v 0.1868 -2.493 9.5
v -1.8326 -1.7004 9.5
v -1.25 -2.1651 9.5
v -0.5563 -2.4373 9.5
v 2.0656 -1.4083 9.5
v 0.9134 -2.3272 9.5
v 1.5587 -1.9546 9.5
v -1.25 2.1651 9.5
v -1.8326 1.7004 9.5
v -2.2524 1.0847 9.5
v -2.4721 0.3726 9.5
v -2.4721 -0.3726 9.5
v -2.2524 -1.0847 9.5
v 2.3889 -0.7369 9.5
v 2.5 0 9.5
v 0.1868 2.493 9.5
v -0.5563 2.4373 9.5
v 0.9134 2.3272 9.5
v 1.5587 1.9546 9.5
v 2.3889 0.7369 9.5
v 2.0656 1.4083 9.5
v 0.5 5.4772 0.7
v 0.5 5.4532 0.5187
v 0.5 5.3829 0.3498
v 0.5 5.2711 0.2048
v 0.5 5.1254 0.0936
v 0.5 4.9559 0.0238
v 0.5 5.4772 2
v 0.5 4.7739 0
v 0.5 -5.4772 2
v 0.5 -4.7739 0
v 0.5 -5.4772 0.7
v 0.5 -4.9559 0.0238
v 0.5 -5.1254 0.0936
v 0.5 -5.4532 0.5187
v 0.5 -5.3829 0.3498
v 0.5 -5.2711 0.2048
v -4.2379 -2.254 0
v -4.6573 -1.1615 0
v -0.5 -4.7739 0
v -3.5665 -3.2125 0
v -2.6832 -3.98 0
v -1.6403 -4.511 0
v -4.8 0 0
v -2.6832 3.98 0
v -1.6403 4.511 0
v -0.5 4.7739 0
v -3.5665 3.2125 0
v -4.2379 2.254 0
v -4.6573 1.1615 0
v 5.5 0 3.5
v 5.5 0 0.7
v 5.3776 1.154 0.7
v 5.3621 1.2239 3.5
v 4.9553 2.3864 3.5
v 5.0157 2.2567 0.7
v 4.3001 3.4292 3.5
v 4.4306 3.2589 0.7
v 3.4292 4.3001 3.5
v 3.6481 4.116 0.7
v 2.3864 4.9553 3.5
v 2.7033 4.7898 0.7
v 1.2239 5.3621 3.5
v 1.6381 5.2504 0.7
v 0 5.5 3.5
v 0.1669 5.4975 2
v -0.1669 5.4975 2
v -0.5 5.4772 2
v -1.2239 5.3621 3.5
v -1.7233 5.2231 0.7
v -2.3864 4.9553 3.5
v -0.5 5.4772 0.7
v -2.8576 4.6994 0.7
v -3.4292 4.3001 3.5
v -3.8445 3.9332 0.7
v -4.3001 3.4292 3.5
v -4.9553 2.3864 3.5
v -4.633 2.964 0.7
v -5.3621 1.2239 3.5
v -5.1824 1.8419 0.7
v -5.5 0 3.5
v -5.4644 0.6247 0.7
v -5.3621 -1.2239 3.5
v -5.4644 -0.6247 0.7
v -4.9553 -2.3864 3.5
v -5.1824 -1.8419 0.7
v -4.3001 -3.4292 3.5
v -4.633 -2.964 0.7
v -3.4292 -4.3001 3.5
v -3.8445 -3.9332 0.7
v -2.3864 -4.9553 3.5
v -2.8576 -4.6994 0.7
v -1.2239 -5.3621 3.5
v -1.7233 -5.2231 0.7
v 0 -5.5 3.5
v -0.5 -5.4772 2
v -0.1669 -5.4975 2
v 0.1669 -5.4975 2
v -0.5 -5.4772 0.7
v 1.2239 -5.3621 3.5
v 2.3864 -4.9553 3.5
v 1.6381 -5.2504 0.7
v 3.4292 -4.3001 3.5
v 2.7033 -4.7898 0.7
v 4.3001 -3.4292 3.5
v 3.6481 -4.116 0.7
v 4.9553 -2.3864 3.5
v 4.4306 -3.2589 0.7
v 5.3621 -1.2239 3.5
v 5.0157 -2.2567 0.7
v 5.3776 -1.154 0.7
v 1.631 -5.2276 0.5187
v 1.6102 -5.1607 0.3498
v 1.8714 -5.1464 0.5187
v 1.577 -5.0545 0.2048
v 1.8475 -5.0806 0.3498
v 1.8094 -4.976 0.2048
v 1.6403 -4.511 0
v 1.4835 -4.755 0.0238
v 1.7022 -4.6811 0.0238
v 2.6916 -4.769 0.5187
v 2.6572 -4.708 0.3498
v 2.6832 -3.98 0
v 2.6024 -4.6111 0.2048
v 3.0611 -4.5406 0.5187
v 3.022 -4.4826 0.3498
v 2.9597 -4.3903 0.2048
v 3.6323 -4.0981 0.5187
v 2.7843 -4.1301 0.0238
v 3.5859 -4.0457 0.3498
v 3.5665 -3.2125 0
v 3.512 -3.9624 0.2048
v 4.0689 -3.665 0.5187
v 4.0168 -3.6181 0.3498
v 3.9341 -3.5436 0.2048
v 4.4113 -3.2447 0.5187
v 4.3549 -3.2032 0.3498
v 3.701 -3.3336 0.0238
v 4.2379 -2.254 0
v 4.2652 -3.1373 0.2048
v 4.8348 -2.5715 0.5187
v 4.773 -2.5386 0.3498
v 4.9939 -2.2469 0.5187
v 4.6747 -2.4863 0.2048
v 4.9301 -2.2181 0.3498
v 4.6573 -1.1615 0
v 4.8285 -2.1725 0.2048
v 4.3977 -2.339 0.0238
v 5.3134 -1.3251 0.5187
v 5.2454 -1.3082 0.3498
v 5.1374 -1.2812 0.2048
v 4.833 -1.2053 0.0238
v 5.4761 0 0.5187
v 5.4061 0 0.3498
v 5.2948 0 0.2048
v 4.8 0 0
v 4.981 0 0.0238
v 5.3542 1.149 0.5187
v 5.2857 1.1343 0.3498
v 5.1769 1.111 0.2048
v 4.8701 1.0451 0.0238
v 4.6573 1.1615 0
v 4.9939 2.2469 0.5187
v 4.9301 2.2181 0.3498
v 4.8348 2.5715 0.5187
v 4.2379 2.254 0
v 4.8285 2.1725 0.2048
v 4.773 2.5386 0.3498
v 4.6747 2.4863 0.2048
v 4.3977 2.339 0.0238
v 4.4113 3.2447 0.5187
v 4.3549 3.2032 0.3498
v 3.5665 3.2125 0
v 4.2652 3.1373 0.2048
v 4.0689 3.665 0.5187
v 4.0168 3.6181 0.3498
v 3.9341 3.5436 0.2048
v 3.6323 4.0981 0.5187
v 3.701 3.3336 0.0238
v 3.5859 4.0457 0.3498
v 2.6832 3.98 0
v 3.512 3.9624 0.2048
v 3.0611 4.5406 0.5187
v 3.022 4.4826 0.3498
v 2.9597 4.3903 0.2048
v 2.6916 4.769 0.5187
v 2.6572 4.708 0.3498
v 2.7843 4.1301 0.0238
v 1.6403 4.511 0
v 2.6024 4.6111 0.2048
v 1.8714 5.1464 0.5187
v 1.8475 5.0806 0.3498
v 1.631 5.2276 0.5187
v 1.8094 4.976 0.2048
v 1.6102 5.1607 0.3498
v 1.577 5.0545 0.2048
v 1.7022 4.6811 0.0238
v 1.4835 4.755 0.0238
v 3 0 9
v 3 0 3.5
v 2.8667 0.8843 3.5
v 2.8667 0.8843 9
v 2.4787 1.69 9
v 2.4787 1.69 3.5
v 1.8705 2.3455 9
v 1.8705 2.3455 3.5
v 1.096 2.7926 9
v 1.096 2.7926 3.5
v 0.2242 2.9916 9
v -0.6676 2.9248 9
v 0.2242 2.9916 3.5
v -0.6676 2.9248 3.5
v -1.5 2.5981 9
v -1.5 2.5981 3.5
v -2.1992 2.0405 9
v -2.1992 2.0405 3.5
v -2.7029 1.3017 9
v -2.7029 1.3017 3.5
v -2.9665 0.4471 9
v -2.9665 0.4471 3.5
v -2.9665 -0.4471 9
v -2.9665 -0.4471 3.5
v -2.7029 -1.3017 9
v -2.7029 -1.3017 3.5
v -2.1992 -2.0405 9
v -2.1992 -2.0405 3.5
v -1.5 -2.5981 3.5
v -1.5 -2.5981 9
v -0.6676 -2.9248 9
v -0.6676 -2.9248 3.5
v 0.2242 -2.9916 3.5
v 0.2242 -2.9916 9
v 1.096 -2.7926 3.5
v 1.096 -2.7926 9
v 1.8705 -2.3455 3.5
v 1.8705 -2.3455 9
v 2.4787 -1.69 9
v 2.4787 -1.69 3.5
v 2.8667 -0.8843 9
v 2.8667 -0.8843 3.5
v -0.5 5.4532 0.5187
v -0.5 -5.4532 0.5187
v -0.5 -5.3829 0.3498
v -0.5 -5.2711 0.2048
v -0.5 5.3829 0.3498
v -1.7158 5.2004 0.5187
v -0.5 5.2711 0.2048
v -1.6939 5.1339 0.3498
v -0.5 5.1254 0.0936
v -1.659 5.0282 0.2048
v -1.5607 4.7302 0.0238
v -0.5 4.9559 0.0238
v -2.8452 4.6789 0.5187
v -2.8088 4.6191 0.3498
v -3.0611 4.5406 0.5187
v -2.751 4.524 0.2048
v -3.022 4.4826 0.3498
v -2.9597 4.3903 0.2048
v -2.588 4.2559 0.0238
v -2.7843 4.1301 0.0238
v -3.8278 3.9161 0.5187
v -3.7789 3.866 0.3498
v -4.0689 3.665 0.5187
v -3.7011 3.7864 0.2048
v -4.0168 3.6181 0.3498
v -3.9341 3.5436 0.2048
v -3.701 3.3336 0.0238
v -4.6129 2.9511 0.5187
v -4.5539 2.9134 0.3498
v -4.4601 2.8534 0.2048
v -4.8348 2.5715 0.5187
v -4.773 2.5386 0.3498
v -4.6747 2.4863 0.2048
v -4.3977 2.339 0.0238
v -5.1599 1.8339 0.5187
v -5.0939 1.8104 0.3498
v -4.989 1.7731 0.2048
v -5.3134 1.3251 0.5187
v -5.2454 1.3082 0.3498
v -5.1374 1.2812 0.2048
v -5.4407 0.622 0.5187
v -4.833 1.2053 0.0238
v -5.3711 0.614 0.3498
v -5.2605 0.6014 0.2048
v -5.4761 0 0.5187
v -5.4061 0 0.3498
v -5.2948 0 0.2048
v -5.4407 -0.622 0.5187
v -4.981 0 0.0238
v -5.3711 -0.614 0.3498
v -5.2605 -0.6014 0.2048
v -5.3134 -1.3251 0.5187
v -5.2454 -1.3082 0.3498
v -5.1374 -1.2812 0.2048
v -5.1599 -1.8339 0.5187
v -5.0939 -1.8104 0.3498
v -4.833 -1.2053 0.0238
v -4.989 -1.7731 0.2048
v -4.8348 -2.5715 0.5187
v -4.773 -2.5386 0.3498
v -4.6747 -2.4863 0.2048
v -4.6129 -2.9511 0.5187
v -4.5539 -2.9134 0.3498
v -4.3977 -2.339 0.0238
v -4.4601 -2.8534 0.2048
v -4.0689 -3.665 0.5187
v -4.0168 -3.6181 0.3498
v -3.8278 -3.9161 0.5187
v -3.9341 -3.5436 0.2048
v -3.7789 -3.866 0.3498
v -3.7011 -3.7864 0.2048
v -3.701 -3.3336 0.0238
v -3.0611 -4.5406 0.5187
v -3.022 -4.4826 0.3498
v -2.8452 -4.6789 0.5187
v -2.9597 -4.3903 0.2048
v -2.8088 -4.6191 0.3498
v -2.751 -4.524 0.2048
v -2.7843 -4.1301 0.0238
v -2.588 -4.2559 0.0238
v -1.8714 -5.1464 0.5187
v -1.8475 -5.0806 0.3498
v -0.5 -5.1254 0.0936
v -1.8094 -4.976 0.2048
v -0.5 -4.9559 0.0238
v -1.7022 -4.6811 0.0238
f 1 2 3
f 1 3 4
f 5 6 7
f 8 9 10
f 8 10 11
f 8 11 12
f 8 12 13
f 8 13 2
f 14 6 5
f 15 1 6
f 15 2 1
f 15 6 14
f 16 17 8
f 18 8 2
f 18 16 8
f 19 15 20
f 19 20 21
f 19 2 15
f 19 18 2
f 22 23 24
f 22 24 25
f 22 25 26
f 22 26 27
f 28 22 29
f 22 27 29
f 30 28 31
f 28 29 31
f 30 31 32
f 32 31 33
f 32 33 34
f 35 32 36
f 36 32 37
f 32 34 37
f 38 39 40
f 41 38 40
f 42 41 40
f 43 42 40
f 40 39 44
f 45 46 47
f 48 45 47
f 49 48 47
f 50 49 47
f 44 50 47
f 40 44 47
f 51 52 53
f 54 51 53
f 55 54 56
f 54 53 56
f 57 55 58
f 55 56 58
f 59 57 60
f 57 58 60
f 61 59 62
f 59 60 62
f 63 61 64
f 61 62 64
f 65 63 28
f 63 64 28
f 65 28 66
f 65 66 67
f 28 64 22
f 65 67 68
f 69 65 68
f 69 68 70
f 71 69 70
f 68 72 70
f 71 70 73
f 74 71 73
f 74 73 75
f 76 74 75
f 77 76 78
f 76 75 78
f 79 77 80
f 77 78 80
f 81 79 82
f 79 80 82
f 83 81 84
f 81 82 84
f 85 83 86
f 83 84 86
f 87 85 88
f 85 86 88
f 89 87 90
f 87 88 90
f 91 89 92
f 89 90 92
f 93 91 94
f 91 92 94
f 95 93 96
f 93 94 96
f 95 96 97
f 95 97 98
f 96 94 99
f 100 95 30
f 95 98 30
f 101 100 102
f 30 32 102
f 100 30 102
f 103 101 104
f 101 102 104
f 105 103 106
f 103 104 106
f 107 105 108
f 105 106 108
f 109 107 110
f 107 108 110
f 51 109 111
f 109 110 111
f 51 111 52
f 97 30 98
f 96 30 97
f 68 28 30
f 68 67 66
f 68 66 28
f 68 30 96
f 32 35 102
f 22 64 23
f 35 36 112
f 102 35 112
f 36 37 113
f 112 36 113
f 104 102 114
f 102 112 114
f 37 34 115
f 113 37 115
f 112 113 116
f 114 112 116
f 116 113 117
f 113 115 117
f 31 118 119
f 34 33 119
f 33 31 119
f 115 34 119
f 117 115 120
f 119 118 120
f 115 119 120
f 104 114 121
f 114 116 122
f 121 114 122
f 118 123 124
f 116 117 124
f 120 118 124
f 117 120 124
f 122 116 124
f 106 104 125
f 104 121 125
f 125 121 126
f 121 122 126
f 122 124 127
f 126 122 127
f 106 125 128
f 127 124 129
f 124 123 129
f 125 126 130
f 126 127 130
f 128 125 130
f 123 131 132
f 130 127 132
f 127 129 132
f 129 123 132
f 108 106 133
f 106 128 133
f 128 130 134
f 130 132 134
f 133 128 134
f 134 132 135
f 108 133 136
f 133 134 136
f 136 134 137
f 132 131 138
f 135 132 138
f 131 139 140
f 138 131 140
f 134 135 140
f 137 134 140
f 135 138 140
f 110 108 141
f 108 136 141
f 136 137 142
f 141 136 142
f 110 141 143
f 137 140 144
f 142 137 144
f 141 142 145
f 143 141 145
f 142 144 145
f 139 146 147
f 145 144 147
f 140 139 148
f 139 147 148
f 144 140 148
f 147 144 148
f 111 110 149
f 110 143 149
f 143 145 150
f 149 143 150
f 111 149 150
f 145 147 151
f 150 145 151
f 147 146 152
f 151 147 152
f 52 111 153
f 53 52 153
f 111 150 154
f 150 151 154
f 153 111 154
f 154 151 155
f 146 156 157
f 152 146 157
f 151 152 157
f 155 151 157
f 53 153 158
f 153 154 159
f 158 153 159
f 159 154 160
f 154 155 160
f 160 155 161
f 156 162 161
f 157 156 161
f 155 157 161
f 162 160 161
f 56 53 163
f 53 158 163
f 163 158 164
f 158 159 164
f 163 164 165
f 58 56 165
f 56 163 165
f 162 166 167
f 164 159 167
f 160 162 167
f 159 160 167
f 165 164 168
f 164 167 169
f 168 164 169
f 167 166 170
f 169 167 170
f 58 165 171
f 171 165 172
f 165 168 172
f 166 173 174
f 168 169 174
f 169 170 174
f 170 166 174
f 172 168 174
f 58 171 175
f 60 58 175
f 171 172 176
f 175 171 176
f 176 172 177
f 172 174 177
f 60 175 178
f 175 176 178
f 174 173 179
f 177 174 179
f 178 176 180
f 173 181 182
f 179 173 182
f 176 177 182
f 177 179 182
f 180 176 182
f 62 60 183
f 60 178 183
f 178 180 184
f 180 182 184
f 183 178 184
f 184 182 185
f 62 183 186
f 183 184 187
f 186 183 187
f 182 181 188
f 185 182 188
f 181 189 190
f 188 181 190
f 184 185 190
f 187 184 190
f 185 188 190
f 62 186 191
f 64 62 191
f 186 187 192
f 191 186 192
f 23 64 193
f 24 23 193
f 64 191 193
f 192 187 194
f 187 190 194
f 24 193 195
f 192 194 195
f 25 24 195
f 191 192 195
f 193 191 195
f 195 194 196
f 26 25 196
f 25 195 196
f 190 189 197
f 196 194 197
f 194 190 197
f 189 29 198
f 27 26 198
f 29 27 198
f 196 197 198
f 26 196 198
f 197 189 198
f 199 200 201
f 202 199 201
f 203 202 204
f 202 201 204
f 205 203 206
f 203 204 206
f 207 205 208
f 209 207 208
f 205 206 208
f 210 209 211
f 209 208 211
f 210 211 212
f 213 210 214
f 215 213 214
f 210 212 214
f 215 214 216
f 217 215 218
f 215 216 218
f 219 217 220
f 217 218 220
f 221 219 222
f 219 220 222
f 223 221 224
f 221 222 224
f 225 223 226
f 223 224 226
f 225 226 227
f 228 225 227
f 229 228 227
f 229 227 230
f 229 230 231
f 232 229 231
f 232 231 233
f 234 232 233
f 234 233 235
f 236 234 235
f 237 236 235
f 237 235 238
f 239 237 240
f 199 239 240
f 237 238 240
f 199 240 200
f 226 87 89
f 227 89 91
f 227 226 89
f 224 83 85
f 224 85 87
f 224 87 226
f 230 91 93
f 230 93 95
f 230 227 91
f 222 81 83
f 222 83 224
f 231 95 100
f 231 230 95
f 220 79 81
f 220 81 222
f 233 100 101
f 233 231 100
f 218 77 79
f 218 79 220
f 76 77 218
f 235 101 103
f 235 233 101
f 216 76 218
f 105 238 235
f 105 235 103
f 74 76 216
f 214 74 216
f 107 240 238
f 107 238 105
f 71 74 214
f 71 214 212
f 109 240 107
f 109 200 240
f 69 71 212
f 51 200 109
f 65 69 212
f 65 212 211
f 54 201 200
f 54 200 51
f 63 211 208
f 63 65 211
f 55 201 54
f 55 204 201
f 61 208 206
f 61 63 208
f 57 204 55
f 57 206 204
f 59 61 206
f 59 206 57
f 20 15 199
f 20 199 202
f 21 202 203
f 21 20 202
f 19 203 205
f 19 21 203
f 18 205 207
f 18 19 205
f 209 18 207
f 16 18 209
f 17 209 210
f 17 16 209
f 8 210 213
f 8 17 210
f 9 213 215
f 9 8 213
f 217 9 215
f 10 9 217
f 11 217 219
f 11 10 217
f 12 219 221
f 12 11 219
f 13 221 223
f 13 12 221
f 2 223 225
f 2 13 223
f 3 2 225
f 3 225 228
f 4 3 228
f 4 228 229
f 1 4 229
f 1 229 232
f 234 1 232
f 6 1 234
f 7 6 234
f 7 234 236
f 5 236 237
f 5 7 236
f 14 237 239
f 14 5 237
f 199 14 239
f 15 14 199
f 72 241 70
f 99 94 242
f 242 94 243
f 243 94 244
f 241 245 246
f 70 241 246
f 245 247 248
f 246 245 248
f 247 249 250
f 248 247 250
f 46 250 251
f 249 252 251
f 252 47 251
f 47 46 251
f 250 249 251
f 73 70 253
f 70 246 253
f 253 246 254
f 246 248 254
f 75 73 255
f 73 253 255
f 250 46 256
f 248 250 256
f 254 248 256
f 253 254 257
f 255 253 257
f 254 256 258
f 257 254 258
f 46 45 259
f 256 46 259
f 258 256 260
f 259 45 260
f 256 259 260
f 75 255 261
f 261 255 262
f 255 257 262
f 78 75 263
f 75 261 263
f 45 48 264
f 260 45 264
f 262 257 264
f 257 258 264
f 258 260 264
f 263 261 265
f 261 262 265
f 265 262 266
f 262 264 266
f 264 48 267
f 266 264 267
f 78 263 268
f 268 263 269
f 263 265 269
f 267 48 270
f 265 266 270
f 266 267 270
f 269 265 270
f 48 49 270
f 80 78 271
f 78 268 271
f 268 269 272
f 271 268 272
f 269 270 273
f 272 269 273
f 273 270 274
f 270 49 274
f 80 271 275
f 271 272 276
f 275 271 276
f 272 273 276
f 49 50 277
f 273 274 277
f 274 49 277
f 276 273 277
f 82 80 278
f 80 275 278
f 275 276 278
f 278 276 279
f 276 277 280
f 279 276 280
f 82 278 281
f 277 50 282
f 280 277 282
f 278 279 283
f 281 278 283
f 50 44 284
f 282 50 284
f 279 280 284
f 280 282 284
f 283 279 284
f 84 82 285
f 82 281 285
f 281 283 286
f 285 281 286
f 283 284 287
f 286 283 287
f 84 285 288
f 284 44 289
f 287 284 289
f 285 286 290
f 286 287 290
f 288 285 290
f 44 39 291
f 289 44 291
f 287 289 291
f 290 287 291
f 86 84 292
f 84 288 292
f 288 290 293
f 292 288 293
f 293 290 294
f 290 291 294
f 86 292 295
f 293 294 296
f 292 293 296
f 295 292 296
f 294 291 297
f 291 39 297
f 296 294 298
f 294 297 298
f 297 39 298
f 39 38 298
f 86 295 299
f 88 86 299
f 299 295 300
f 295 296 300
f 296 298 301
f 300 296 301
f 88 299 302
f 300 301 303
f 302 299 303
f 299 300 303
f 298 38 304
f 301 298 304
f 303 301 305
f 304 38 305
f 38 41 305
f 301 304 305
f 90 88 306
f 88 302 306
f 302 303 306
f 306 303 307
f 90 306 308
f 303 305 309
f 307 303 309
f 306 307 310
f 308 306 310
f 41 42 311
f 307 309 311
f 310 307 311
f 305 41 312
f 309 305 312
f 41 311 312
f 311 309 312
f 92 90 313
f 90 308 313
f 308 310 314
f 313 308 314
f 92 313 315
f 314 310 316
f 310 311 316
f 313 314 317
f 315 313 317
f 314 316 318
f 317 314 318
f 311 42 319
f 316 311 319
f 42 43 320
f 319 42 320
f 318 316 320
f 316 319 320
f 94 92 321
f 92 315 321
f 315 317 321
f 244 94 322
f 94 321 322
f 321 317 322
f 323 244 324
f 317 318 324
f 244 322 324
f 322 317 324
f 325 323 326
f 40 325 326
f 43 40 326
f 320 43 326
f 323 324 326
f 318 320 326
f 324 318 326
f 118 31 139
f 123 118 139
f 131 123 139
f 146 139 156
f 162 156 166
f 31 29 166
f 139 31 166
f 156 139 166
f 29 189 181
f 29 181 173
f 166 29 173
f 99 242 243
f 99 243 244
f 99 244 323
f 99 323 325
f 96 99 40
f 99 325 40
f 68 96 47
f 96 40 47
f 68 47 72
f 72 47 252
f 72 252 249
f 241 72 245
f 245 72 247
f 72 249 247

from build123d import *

# Parameters (mm, degrees)
ESQUISSE2_R             = 5.5
BOSS_EXTRU_1_DEPTH      = 3.5
ESQUISSE3_R             = 3
BOSS_EXTRU_2_DEPTH      = 6
CONG_2_R                = 0.7
CHANFREIN1_SIZE         = 0.5
ENL_V_MAT_EXTRU_1_DEPTH = 2


with BuildPart() as part:
    # Esquisse2 → Boss.-Extru.1 (new body)
    with BuildSketch(Plane.XY):
        Circle(ESQUISSE2_R)
    extrude(amount=BOSS_EXTRU_1_DEPTH)

    # Esquisse3 → Boss.-Extru.2 (add)
    with BuildSketch(Plane.XY.offset(3.5)):
        Circle(ESQUISSE3_R)
    extrude(amount=BOSS_EXTRU_2_DEPTH)

    # Congé2
    cong_2_edges = [part.edges().sort_by_distance(p)[0] for p in [
        (-5.5, 0, 0),
    ]]
    fillet(cong_2_edges, radius=CONG_2_R)

    # Chanfrein1
    chanfrein1_edges = [part.edges().sort_by_distance(p)[0] for p in [
        (-3, 0, 9.5),
    ]]
    chamfer(chanfrein1_edges, length=CHANFREIN1_SIZE)

    # Esquisse4 → Enlèv. mat.-Extru.1 (cut)
    with BuildSketch(Plane(origin=(0, 0, 0), x_dir=(-1, 0, 0), z_dir=(0, 0, -1))):
        with BuildLine():
            Line((-0.5, 5.477225575), (-0.5, -5.477225575))
            ThreePointArc((-0.5, -5.477225575), (0, -5.5), (0.5, -5.477225575))
            Line((0.5, -5.477225575), (0.5, 5.477225575))
            ThreePointArc((0.5, 5.477225575), (0, 5.5), (-0.5, 5.477225575))
        make_face()
    extrude(amount=-ENL_V_MAT_EXTRU_1_DEPTH, mode=Mode.SUBTRACT)


solid = part.part
